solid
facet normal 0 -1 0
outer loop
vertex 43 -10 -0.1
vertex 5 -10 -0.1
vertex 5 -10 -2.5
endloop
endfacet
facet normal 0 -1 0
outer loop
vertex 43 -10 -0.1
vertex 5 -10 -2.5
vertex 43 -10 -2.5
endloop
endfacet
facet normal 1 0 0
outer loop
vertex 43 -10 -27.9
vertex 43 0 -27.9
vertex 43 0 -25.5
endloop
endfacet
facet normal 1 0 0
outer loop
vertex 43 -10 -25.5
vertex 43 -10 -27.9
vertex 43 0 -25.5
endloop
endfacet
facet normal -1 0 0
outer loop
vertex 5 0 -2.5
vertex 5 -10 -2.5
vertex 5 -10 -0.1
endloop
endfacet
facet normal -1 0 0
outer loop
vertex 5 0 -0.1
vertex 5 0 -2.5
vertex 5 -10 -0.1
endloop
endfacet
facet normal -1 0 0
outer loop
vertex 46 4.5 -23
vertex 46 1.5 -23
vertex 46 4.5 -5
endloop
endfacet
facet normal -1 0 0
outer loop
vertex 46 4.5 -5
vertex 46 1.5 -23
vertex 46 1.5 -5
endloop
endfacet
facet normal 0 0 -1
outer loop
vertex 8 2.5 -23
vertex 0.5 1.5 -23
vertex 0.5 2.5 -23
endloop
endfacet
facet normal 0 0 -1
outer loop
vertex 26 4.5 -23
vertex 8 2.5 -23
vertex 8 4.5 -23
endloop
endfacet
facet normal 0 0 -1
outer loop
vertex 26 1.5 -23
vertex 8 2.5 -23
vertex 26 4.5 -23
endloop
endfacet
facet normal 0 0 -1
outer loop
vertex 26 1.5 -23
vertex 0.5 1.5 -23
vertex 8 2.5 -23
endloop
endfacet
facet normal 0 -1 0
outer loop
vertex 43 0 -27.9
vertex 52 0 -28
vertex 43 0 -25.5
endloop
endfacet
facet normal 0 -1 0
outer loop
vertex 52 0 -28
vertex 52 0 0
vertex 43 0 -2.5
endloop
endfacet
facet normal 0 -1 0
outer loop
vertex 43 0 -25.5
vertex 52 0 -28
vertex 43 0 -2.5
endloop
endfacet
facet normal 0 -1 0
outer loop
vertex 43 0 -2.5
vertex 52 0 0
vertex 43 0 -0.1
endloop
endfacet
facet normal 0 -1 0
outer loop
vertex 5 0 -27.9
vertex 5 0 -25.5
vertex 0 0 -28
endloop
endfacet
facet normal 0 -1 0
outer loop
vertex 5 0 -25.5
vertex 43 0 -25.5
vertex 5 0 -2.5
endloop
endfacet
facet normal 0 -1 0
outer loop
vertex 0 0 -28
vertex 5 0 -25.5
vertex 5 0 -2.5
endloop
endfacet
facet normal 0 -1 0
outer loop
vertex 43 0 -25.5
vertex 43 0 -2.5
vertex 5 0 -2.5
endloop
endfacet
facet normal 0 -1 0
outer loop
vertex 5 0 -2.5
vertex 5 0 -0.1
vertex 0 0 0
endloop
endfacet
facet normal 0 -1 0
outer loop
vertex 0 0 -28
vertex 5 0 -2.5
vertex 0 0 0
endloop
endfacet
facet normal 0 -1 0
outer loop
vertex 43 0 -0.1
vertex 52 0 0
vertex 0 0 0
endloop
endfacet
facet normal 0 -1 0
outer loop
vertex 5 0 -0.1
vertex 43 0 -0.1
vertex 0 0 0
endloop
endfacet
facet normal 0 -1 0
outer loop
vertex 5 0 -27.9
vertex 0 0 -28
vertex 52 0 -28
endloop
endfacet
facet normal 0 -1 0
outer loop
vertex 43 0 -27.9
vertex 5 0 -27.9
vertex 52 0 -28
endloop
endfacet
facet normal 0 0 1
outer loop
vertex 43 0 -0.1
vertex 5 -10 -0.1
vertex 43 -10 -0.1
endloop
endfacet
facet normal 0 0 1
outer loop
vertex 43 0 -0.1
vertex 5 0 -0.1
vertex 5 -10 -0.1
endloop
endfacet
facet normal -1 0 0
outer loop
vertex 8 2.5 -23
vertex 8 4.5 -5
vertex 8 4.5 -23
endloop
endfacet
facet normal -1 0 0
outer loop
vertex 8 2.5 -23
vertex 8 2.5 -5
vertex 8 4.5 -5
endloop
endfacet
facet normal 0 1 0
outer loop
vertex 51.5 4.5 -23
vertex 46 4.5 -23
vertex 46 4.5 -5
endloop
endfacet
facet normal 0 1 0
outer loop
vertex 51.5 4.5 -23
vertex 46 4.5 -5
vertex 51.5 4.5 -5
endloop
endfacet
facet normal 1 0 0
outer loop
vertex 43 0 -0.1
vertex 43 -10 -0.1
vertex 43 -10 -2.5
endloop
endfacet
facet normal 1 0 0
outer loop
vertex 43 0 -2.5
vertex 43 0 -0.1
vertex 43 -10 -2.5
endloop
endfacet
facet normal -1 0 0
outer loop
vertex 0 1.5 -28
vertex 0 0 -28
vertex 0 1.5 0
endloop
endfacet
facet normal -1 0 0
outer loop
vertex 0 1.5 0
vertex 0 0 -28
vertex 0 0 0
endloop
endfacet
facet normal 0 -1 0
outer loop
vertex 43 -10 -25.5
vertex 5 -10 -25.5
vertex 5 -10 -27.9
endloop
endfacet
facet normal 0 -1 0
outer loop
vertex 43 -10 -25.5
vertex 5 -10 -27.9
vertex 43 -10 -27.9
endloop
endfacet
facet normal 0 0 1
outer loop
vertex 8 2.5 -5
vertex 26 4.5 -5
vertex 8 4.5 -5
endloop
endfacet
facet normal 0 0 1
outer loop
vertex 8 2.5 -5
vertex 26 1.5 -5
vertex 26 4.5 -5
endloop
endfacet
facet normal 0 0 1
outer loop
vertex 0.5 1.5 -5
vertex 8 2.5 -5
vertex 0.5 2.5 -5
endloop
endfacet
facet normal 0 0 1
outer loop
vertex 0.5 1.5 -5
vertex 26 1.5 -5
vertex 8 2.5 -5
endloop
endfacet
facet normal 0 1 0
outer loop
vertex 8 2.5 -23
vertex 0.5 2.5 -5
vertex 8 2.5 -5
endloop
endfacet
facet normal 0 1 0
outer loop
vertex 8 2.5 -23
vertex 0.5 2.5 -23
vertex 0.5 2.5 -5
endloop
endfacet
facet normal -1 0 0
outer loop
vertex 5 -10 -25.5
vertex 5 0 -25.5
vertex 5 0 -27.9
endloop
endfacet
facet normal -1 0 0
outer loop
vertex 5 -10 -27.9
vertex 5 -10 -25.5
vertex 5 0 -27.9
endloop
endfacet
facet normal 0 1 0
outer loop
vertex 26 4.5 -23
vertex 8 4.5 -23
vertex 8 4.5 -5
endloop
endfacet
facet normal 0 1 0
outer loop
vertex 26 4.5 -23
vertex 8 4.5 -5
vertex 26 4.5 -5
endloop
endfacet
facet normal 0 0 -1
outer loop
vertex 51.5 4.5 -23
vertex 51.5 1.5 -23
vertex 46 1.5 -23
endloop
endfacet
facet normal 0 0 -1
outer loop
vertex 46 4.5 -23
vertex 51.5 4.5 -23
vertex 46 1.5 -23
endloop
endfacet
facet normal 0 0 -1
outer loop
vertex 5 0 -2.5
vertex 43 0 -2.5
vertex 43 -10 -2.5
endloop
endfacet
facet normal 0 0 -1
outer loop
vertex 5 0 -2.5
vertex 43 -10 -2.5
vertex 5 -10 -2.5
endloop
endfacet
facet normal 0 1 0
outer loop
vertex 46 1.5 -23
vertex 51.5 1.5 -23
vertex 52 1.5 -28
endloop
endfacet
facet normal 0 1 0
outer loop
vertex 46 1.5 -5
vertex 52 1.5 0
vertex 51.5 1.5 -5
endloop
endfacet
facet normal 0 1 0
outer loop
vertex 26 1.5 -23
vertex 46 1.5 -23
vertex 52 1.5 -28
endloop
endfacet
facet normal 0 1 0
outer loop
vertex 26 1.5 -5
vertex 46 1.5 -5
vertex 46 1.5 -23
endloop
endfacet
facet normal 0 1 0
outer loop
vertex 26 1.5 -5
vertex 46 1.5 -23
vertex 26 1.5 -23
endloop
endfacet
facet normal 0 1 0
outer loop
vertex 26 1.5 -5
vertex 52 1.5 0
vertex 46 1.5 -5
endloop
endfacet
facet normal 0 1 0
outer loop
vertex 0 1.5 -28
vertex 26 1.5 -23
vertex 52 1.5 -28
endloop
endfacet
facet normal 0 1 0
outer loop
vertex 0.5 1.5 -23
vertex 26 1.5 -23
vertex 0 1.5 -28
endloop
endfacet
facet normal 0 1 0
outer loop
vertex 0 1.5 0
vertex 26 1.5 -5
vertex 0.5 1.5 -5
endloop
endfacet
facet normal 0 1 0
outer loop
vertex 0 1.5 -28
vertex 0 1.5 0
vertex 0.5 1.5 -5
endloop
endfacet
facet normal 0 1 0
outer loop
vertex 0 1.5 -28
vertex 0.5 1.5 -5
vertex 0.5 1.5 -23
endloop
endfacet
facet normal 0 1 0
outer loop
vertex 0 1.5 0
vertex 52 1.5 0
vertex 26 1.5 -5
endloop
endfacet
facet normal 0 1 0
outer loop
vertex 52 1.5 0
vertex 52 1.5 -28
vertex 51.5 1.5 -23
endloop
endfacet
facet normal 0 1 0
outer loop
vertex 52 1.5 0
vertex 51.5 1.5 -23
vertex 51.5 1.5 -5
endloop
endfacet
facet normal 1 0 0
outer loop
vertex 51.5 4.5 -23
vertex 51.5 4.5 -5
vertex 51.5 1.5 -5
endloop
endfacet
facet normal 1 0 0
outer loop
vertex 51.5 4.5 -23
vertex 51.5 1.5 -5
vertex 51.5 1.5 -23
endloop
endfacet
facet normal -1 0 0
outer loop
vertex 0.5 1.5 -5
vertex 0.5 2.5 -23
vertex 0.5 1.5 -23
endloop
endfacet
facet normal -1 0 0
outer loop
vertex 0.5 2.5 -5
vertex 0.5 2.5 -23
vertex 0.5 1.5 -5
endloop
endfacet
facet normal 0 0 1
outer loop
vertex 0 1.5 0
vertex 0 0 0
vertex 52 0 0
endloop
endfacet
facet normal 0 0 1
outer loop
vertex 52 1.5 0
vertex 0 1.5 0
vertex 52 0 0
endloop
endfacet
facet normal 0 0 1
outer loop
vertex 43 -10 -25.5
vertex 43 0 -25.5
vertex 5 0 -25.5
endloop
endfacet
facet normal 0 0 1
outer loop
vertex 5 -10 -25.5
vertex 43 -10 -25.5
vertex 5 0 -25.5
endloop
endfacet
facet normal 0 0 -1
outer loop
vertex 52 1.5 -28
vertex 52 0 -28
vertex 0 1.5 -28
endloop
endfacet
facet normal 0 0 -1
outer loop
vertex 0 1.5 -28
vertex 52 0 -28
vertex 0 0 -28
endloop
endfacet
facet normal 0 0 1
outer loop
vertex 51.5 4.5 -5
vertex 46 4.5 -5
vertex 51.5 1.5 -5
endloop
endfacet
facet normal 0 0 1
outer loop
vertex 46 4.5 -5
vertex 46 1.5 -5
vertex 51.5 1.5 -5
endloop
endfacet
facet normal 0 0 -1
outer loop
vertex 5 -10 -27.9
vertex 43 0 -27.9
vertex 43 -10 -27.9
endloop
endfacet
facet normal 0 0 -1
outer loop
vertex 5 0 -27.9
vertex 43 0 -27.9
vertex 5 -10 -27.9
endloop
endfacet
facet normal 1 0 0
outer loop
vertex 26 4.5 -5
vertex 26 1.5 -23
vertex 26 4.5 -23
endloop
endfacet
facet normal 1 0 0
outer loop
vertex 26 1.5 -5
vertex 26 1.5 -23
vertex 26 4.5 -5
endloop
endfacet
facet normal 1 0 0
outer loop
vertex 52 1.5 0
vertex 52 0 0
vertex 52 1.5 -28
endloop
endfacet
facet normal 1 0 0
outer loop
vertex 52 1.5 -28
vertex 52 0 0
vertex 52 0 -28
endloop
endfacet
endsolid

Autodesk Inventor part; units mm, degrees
ref_plane "YZ Plane" through (0, 0, 0) normal (1, 0, 0) x (0, 1, 0)
ref_plane "XZ Plane" through (0, 0, 0) normal (0, 1, 0) x (-1, 0, 0)
ref_plane "XY Plane" through (0, 0, 0) normal (0, 0, 1) x (1, 0, 0)
sketch "Sketch1" plane through (0, 0, 0) normal (0, 1, 0) x (-1, 0, 0)
  line L0 (0, 0) -> (-52, 0)
  line L1 (-52, 0) -> (-52, -28)
  line L2 (-52, -28) -> (0, -28)
  line L3 (0, -28) -> (0, 0)
  dimension "d0" = 52
  dimension "d1" = 28
extrude "Extrusion1" add sketch "Sketch1" along normal blind 1.5
sketch "Sketch2" plane through (0, 1.5, 0) normal (0, 1, 0) x (1, 0, 0)
  line L0 (0, 0) -> (0, 5) construction
  line L1 (0, 28) -> (0, 0) construction
  line L2 (0, 28) -> (0, 23) construction
  line L3 (0, 23) -> (8, 23)
  line L4 (8, 23) -> (8, 5)
  line L5 (8, 5) -> (0, 5)
  line L6 (0, 5) -> (0, 23)
  dimension "d4" = 5
  dimension "d5" = 5
  dimension "d6" = 8
extrude "Extrusion2" add sketch "Sketch2" along normal blind 1
sketch "Sketch3" plane through (0, 1.5, 0) normal (0, 1, 0) x (1, 0, 0)
  line L0 (8, 5) -> (8, 23) projected
  line L1 (8, 23) -> (26, 23)
  line L2 (26, 23) -> (26, 5)
  line L3 (26, 5) -> (8, 5)
  line L4 (8, 5) -> (8, 23)
  point P0 (0, 0)
  dimension "d9" = 18
extrude "Extrusion3" add sketch "Sketch3" along normal blind 3
sketch "Sketch4" plane through (0, 1.5, 0) normal (0, 1, 0) x (1, 0, 0)
  line L0 (52, 28) -> (52, 23) construction
  line L1 (52, 0) -> (52, 28) construction
  line L2 (52, 0) -> (52, 5) construction
  line L3 (52, 23) -> (46, 23)
  line L4 (46, 23) -> (46, 5)
  line L5 (46, 5) -> (52, 5)
  line L6 (52, 5) -> (52, 23)
  point P0 (0, 0)
  dimension "d12" = 5
  dimension "d13" = 5
  dimension "d14" = 6
extrude "Extrusion4" add sketch "Sketch4" along normal blind 3
sketch "Sketch5" plane through (52, 0, 0) normal (1, 0, 0) x (0, 0, -1)
  line L0 (5, 4.5) -> (23, 4.5) projected
  line L1 (23, 1.5) -> (28, 1.5) projected
  line L2 (5, 4.5) -> (23, 4.5)
  line L3 (23, 4.5) -> (23, 1.5)
  line L4 (23, 1.5) -> (5, 1.5)
  line L5 (5, 1.5) -> (5, 4.5)
  point P0 (0, 0)
extrude "Extrusion5" cut sketch "Sketch5" against normal blind 0.5
sketch "Sketch6" plane through (0, 0, -28) normal (-1, 0, 0) x (0, 0, 1)
  line L0 (5, 2.5) -> (23, 2.5) projected
  line L1 (23, 1.5) -> (5, 1.5) projected
  line L2 (5, 2.5) -> (23, 2.5)
  line L3 (23, 2.5) -> (23, 1.5)
  line L4 (23, 1.5) -> (5, 1.5)
  line L5 (5, 1.5) -> (5, 2.5)
  point P0 (28, 0)
extrude "Extrusion6" cut sketch "Sketch6" against normal blind 0.5
sketch "Sketch7" plane through (0, 0, 0) normal (0, -1, 0) x (1, 0, 0)
  line L0 (0, -28) -> (0, 0) construction
  line L1 (0, 0) -> (5, 0) construction
  line L2 (0, 0) -> (52, 0) construction
  line L3 (52, 0) -> (43, 0) construction
  line L4 (5, 0) -> (43, 0)
  line L5 (43, 0) -> (43, -2.5)
  line L6 (43, -2.5) -> (5, -2.5)
  line L7 (5, -2.5) -> (5, 0)
  line L8 (52, -28) -> (0, -28) projected
  line L9 (5, -28) -> (43, -28)
  line L10 (43, -28) -> (43, -25.5)
  line L11 (43, -25.5) -> (5, -25.5)
  line L12 (5, -25.5) -> (5, -28)
  dimension "d21" = 5
  dimension "d22" = 9
  dimension "d23" = 2.5
  dimension "d24" = 2.5
extrude "Extrusion7" add sketch "Sketch7" along normal blind 10
sketch "Sketch8" plane through (52, 1.5, -28) normal (0, 0, -1) x (-1, 0, 0)
  line L0 (47, -11.5) -> (9, -11.5) projected
  line L1 (9, -1.5) -> (9, -11.5) projected
  line L2 (47, -11.5) -> (9, -11.5)
  line L3 (9, -11.5) -> (9, -1.5)
  line L4 (9, -1.5) -> (47, -1.5)
  line L5 (47, -1.5) -> (47, -11.5)
  point P0 (52, -1.5)
extrude "Extrusion8" cut sketch "Sketch8" against normal blind 0.1
sketch "Sketch9" plane through (0, 1.5, 0) normal (0, 0, 1) x (1, 0, 0)
  line L0 (5, -1.5) -> (5, -11.5) projected
  line L1 (43, -11.5) -> (43, -1.5) projected
  line L2 (5, -1.5) -> (43, -1.5)
  line L3 (43, -1.5) -> (43, -11.5)
  line L4 (43, -11.5) -> (5, -11.5)
  line L5 (5, -11.5) -> (5, -1.5)
  point P0 (0, -1.5)
extrude "Extrusion9" cut sketch "Sketch9" against normal blind 0.1
properties part number "ESP32"
